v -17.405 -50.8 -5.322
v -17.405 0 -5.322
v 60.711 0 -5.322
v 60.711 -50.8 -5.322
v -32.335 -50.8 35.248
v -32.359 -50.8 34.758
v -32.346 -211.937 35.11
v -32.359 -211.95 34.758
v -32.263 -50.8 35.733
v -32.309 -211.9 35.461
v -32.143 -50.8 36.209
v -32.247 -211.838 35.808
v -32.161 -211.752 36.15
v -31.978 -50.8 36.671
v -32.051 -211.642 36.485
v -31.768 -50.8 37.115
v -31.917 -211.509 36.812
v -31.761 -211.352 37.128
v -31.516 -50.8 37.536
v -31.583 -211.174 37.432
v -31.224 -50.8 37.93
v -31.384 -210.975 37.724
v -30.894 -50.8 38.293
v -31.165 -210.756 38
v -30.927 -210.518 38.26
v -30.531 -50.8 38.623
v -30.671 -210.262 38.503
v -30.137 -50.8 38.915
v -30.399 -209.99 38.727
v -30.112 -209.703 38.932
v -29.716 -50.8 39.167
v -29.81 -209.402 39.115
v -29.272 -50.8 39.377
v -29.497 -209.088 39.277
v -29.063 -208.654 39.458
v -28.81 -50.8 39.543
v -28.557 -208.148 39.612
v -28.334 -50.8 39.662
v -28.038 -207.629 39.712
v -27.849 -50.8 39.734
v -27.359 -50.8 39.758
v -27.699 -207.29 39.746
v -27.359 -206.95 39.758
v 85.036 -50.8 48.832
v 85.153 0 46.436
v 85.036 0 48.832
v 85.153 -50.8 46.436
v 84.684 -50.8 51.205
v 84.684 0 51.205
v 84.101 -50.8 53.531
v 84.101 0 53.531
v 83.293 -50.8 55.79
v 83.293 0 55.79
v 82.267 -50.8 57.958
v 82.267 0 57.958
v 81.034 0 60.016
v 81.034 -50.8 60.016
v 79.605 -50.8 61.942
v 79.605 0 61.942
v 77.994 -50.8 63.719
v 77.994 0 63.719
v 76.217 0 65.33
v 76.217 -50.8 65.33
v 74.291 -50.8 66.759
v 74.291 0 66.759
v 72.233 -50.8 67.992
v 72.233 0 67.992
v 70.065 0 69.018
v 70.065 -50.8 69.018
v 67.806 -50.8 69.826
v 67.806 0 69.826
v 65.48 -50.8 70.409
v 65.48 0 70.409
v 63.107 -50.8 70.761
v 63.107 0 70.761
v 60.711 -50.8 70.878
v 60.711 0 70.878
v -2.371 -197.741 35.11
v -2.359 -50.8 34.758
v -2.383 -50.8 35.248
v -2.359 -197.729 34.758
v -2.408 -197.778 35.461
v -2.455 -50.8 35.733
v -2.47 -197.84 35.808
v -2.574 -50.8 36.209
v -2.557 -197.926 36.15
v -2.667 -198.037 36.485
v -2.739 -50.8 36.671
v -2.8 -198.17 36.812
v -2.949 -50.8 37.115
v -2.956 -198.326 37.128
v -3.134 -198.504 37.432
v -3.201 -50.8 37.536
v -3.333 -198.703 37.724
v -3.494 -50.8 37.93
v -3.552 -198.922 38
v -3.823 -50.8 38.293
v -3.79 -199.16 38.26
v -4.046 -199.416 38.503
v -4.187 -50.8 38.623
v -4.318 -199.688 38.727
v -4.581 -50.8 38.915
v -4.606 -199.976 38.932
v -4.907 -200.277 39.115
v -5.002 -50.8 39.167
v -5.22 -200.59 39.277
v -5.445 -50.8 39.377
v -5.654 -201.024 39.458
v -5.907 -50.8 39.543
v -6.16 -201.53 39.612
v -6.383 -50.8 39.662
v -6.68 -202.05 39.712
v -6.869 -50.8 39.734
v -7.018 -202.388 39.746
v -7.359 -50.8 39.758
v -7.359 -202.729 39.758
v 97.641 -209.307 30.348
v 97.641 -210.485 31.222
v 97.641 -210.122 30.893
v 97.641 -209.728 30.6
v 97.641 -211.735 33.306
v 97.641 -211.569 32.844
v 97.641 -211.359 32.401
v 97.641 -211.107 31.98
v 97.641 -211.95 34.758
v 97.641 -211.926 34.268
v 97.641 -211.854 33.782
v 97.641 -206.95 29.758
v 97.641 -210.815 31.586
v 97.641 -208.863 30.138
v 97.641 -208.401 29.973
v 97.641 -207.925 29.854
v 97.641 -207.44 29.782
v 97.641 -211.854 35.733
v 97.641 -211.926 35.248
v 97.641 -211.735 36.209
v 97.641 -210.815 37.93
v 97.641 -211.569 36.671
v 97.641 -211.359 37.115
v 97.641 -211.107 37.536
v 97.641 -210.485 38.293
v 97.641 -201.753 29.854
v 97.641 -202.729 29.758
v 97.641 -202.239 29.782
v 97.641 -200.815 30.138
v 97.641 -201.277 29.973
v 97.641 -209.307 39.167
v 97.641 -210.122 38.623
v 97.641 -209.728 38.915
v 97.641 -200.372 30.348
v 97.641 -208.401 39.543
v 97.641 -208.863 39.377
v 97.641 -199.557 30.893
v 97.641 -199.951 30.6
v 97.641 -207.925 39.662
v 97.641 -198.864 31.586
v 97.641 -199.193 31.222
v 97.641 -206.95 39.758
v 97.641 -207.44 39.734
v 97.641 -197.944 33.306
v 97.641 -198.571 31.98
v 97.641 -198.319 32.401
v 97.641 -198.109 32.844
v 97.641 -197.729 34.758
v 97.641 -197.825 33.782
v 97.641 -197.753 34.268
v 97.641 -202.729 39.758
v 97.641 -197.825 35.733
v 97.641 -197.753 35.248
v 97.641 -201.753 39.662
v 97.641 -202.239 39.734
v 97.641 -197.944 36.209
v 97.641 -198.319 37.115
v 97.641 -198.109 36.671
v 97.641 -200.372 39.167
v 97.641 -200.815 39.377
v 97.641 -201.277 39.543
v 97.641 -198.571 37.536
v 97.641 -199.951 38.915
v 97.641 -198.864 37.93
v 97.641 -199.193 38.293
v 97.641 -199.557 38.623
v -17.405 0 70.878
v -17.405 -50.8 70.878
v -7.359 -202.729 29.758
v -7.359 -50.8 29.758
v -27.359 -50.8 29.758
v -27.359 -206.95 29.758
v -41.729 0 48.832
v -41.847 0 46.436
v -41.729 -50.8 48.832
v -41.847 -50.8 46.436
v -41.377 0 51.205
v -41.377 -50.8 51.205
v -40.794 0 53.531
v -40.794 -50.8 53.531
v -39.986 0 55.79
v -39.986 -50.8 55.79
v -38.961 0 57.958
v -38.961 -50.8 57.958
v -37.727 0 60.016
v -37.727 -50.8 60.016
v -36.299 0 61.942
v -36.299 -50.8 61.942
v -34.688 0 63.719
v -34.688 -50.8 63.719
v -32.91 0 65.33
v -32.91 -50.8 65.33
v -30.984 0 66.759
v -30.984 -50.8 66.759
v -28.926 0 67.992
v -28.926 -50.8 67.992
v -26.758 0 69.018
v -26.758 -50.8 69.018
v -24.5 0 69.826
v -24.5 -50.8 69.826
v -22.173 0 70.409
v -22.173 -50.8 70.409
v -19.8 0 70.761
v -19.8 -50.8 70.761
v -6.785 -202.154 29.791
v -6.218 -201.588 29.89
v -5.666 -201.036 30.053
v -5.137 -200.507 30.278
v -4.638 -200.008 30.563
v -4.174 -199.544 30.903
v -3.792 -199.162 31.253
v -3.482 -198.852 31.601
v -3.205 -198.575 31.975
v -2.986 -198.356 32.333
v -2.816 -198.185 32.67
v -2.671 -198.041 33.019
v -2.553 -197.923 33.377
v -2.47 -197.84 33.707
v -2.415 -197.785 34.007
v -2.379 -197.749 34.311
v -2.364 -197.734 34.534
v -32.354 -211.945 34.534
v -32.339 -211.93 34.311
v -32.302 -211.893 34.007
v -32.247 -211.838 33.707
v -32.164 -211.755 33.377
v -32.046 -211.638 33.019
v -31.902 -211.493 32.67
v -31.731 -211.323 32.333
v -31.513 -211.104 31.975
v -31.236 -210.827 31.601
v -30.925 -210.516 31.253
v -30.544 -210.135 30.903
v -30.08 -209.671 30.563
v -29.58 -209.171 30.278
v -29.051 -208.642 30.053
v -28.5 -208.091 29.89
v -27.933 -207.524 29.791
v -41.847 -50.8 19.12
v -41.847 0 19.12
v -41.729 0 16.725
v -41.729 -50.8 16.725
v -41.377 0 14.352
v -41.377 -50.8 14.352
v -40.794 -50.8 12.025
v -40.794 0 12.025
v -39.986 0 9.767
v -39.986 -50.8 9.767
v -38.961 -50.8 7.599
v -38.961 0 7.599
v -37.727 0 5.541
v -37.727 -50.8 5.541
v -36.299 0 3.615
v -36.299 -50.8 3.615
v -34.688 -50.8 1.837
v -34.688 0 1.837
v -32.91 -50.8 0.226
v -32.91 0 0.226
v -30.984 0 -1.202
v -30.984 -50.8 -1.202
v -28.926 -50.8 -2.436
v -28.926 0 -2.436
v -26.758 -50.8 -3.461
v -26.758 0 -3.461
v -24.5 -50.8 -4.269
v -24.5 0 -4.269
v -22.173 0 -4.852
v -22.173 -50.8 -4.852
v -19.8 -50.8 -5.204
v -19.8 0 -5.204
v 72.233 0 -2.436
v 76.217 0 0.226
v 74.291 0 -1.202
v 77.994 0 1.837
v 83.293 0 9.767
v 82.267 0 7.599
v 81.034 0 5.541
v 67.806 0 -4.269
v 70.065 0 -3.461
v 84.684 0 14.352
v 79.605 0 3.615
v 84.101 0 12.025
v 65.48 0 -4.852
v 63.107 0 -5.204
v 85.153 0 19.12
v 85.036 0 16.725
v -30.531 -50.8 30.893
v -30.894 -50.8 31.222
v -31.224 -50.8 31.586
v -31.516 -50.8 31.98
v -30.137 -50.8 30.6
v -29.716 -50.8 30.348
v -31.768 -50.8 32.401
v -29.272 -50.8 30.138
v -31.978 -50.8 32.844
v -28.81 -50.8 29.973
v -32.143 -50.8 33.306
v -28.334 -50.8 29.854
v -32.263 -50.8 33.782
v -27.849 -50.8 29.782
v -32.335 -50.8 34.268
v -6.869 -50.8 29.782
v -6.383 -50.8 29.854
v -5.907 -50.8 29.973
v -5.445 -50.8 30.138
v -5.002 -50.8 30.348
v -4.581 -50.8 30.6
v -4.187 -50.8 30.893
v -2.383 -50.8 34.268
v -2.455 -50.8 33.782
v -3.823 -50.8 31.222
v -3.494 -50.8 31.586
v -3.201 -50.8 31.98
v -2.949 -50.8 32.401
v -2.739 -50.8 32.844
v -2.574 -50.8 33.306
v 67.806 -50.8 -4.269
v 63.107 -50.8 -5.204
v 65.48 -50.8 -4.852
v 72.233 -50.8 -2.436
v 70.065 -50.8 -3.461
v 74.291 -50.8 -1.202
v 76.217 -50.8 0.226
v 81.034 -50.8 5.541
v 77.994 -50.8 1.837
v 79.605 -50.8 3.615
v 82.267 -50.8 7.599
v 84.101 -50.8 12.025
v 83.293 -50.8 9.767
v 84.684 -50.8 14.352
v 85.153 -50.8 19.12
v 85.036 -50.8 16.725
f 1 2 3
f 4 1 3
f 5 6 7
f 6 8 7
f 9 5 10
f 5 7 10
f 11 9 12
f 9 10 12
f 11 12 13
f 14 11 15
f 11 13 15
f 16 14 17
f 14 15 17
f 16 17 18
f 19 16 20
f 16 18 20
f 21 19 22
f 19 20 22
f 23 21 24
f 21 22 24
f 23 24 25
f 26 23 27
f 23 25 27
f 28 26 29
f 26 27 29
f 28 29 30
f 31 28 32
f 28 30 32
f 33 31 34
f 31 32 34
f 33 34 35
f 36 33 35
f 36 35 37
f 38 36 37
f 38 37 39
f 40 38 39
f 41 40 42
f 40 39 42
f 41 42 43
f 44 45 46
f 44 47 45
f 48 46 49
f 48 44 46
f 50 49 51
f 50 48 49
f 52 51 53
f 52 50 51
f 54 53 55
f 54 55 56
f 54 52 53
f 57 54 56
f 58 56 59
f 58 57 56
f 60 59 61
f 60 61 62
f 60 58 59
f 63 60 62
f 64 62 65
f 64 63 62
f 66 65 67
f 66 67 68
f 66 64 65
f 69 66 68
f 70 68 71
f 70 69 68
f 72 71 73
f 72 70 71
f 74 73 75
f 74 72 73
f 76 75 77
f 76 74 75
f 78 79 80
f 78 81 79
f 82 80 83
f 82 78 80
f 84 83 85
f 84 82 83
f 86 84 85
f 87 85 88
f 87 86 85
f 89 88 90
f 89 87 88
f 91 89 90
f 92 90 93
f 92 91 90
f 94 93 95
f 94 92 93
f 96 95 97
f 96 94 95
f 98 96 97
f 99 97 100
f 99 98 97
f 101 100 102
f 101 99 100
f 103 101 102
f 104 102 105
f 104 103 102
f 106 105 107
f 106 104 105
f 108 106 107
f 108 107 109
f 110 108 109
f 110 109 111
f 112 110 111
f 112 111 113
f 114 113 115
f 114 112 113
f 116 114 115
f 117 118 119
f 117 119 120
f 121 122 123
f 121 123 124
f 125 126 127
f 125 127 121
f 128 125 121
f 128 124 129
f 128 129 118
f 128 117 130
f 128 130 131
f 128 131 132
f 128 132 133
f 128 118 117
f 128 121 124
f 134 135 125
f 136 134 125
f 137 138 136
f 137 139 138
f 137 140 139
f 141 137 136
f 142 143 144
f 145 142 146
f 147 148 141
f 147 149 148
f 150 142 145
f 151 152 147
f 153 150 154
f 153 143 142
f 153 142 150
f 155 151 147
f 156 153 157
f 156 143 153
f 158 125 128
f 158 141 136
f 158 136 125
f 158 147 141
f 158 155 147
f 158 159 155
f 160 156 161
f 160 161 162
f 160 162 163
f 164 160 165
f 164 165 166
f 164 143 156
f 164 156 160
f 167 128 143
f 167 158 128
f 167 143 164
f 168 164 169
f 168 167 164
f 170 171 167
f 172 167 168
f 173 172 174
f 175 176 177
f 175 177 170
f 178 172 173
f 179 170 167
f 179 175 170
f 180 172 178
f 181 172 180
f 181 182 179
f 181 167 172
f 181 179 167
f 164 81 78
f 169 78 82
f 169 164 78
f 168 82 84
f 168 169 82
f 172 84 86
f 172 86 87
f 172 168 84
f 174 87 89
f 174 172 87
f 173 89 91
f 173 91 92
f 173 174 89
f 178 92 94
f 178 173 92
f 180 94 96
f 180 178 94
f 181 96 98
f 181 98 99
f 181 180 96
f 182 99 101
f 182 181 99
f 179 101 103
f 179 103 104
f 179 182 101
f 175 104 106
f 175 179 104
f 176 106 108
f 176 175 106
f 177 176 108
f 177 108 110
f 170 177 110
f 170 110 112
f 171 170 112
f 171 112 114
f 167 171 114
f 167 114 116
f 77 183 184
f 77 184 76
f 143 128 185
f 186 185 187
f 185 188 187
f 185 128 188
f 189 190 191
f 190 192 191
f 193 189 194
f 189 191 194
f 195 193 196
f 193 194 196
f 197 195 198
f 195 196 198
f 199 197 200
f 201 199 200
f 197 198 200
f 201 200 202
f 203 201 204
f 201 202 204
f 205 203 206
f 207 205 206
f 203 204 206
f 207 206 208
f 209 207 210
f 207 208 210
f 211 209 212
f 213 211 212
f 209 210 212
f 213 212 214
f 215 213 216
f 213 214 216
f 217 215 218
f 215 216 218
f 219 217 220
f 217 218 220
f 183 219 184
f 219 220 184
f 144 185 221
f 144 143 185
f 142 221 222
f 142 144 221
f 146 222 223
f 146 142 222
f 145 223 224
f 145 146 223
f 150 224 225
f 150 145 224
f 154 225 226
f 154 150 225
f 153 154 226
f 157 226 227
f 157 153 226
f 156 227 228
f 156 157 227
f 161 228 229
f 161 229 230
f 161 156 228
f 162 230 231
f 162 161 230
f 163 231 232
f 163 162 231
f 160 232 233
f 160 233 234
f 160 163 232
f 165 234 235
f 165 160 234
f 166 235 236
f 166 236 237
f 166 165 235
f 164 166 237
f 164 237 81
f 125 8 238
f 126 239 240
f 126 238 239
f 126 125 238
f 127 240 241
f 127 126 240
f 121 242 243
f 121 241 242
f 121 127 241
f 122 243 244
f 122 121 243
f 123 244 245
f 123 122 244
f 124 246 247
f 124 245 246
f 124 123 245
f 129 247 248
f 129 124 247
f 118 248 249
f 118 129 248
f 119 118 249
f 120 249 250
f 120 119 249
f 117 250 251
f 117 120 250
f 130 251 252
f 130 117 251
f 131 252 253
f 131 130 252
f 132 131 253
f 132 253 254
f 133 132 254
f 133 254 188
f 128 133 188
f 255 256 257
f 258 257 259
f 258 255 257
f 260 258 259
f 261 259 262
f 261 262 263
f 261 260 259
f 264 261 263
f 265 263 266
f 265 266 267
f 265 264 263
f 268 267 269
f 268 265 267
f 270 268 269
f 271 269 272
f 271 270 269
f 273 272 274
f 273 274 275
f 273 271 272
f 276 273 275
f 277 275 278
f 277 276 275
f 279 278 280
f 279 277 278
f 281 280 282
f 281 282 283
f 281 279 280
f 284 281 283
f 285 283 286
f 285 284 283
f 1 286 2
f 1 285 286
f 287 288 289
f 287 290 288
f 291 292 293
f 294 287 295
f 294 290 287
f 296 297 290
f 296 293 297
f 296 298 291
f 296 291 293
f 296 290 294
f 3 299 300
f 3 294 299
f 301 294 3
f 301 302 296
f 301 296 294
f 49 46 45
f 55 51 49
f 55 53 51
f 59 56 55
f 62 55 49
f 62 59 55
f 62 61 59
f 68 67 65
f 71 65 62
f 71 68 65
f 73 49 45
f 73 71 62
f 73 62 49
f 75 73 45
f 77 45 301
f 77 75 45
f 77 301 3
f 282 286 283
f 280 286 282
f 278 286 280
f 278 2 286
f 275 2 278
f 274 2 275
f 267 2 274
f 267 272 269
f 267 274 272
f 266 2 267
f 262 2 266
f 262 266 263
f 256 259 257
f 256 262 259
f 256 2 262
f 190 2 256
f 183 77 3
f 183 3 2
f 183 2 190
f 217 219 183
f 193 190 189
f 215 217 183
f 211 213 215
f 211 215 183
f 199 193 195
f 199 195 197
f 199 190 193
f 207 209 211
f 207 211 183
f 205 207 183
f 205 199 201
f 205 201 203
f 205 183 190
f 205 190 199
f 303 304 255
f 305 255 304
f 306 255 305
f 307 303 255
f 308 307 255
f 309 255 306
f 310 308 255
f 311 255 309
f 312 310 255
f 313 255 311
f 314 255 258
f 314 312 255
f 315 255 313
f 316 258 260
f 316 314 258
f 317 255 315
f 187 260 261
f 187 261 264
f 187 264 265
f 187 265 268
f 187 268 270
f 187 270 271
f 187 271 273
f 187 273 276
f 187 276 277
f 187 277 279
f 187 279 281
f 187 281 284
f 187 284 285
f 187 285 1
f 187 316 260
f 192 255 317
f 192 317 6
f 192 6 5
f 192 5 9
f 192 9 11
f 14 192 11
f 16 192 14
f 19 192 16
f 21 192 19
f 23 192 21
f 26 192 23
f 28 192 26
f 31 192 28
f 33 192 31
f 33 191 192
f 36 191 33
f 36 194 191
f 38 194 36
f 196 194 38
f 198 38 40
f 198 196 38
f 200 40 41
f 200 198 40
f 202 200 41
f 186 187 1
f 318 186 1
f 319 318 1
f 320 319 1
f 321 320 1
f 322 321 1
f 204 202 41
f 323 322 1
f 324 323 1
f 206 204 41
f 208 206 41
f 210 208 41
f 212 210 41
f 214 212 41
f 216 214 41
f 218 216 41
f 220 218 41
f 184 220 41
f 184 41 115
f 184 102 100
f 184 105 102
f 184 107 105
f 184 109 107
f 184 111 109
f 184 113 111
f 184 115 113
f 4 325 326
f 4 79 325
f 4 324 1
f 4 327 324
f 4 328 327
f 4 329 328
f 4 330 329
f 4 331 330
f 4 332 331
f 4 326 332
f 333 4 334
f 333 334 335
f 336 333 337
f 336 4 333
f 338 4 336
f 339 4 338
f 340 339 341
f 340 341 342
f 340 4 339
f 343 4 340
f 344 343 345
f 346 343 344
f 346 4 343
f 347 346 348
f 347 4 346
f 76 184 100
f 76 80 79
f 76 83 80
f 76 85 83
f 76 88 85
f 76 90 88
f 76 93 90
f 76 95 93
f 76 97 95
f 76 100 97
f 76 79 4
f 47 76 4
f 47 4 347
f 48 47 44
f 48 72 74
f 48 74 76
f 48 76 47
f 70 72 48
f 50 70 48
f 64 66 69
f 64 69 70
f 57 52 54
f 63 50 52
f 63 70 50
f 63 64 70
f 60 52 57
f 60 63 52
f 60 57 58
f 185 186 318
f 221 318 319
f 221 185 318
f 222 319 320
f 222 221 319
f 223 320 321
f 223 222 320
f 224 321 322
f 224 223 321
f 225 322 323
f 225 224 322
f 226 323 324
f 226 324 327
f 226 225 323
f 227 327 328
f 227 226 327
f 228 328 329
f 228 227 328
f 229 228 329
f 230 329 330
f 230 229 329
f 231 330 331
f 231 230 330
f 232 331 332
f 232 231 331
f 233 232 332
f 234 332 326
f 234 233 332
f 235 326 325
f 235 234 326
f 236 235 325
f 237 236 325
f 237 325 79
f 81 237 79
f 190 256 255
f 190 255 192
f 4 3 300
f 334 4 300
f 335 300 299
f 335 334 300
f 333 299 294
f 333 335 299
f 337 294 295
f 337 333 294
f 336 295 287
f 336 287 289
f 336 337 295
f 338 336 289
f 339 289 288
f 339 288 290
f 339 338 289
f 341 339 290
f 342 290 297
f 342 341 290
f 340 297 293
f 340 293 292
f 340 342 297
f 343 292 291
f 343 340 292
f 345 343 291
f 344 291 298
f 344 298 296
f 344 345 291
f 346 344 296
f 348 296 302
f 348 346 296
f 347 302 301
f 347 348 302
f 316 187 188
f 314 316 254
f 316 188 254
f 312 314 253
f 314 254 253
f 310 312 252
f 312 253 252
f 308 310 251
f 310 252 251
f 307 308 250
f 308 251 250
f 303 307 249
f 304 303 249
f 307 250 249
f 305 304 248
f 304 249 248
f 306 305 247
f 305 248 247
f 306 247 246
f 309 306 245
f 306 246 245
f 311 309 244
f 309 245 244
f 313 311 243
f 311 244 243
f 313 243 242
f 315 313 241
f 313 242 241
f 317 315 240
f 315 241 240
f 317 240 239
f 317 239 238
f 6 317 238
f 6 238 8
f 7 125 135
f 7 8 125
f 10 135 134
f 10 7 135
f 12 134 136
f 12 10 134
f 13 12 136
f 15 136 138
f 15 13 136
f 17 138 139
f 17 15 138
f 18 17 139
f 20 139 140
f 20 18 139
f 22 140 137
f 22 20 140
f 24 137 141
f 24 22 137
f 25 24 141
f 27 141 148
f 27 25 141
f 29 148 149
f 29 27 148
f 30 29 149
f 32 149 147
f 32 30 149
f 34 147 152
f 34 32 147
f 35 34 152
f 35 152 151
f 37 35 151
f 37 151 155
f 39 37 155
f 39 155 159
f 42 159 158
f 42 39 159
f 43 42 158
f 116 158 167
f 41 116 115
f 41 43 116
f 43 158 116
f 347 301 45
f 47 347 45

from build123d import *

# Parameters (mm, degrees)
F0_W     = 127
F0_H     = 76.2
F1_DEPTH = 50.8
F2_R     = 24.4421069165
F4_W     = 30
F4_H     = 10
F5_DEPTH = 211.9498550892
F6_W     = 14.2212212086
F6_H     = 10
F7_DEPTH = 100
F8_R     = 4.99999


# Not quite as in the source:
# - a fillet or chamfer is up to 0.001 mm smaller than in the source, because OpenCascade refuses the exact size


with BuildPart() as f1:
    # F0 (on Front) → F1 (new body)
    with BuildSketch(Plane.XZ):
        with Locations((21.6533541679, 32.7783897177)):
            Rectangle(F0_W, F0_H)
    extrude(amount=F1_DEPTH)

    # F2
    f2_edges = [f1.edges().sort_by_distance(p)[0] for p in [
        (-41.846646, -25.4, 70.87839),
        (-41.846646, -25.4, -5.32161),
        (85.153354, -25.4, -5.32161),
        (85.153354, -25.4, 70.87839),
    ]]
    fillet(f2_edges, radius=F2_R)

    # F4 (on face) → F5 (join)
    with BuildSketch(Plane(origin=(0, 0, 0), x_dir=(-1, 0, 0), z_dir=(0, 1, 0))):
        with Locations((17.3587081618, 34.757822752)):
            Rectangle(F4_W, F4_H)
    extrude(amount=-F5_DEPTH)

    # F6 (on face) → F7 (join)
    with BuildSketch(Plane.YZ.offset(-2.3587081618)):
        with Locations((-204.8392444849, 34.757822752)):
            Rectangle(F6_W, F6_H)
    extrude(amount=F7_DEPTH)

    # F8 (radius 5 in the source; OpenCascade refuses exactly that, so slightly less here)
    f8_edges = [f1.edges().sort_by_distance(p)[0] for p in [
        (-32.358708, -131.374928, 39.757823),
        (-32.358708, -131.374928, 29.757823),
        (32.641292, -211.949855, 29.757823),
        (-2.358708, -124.264317, 29.757823),
        (-2.358708, -124.264317, 39.757823),
        (47.641292, -197.728634, 39.757823),
        (32.641292, -211.949855, 39.757823),
        (47.641292, -197.728634, 29.757823),
    ]]
    fillet(f8_edges, radius=F8_R)


solid = f1.part
